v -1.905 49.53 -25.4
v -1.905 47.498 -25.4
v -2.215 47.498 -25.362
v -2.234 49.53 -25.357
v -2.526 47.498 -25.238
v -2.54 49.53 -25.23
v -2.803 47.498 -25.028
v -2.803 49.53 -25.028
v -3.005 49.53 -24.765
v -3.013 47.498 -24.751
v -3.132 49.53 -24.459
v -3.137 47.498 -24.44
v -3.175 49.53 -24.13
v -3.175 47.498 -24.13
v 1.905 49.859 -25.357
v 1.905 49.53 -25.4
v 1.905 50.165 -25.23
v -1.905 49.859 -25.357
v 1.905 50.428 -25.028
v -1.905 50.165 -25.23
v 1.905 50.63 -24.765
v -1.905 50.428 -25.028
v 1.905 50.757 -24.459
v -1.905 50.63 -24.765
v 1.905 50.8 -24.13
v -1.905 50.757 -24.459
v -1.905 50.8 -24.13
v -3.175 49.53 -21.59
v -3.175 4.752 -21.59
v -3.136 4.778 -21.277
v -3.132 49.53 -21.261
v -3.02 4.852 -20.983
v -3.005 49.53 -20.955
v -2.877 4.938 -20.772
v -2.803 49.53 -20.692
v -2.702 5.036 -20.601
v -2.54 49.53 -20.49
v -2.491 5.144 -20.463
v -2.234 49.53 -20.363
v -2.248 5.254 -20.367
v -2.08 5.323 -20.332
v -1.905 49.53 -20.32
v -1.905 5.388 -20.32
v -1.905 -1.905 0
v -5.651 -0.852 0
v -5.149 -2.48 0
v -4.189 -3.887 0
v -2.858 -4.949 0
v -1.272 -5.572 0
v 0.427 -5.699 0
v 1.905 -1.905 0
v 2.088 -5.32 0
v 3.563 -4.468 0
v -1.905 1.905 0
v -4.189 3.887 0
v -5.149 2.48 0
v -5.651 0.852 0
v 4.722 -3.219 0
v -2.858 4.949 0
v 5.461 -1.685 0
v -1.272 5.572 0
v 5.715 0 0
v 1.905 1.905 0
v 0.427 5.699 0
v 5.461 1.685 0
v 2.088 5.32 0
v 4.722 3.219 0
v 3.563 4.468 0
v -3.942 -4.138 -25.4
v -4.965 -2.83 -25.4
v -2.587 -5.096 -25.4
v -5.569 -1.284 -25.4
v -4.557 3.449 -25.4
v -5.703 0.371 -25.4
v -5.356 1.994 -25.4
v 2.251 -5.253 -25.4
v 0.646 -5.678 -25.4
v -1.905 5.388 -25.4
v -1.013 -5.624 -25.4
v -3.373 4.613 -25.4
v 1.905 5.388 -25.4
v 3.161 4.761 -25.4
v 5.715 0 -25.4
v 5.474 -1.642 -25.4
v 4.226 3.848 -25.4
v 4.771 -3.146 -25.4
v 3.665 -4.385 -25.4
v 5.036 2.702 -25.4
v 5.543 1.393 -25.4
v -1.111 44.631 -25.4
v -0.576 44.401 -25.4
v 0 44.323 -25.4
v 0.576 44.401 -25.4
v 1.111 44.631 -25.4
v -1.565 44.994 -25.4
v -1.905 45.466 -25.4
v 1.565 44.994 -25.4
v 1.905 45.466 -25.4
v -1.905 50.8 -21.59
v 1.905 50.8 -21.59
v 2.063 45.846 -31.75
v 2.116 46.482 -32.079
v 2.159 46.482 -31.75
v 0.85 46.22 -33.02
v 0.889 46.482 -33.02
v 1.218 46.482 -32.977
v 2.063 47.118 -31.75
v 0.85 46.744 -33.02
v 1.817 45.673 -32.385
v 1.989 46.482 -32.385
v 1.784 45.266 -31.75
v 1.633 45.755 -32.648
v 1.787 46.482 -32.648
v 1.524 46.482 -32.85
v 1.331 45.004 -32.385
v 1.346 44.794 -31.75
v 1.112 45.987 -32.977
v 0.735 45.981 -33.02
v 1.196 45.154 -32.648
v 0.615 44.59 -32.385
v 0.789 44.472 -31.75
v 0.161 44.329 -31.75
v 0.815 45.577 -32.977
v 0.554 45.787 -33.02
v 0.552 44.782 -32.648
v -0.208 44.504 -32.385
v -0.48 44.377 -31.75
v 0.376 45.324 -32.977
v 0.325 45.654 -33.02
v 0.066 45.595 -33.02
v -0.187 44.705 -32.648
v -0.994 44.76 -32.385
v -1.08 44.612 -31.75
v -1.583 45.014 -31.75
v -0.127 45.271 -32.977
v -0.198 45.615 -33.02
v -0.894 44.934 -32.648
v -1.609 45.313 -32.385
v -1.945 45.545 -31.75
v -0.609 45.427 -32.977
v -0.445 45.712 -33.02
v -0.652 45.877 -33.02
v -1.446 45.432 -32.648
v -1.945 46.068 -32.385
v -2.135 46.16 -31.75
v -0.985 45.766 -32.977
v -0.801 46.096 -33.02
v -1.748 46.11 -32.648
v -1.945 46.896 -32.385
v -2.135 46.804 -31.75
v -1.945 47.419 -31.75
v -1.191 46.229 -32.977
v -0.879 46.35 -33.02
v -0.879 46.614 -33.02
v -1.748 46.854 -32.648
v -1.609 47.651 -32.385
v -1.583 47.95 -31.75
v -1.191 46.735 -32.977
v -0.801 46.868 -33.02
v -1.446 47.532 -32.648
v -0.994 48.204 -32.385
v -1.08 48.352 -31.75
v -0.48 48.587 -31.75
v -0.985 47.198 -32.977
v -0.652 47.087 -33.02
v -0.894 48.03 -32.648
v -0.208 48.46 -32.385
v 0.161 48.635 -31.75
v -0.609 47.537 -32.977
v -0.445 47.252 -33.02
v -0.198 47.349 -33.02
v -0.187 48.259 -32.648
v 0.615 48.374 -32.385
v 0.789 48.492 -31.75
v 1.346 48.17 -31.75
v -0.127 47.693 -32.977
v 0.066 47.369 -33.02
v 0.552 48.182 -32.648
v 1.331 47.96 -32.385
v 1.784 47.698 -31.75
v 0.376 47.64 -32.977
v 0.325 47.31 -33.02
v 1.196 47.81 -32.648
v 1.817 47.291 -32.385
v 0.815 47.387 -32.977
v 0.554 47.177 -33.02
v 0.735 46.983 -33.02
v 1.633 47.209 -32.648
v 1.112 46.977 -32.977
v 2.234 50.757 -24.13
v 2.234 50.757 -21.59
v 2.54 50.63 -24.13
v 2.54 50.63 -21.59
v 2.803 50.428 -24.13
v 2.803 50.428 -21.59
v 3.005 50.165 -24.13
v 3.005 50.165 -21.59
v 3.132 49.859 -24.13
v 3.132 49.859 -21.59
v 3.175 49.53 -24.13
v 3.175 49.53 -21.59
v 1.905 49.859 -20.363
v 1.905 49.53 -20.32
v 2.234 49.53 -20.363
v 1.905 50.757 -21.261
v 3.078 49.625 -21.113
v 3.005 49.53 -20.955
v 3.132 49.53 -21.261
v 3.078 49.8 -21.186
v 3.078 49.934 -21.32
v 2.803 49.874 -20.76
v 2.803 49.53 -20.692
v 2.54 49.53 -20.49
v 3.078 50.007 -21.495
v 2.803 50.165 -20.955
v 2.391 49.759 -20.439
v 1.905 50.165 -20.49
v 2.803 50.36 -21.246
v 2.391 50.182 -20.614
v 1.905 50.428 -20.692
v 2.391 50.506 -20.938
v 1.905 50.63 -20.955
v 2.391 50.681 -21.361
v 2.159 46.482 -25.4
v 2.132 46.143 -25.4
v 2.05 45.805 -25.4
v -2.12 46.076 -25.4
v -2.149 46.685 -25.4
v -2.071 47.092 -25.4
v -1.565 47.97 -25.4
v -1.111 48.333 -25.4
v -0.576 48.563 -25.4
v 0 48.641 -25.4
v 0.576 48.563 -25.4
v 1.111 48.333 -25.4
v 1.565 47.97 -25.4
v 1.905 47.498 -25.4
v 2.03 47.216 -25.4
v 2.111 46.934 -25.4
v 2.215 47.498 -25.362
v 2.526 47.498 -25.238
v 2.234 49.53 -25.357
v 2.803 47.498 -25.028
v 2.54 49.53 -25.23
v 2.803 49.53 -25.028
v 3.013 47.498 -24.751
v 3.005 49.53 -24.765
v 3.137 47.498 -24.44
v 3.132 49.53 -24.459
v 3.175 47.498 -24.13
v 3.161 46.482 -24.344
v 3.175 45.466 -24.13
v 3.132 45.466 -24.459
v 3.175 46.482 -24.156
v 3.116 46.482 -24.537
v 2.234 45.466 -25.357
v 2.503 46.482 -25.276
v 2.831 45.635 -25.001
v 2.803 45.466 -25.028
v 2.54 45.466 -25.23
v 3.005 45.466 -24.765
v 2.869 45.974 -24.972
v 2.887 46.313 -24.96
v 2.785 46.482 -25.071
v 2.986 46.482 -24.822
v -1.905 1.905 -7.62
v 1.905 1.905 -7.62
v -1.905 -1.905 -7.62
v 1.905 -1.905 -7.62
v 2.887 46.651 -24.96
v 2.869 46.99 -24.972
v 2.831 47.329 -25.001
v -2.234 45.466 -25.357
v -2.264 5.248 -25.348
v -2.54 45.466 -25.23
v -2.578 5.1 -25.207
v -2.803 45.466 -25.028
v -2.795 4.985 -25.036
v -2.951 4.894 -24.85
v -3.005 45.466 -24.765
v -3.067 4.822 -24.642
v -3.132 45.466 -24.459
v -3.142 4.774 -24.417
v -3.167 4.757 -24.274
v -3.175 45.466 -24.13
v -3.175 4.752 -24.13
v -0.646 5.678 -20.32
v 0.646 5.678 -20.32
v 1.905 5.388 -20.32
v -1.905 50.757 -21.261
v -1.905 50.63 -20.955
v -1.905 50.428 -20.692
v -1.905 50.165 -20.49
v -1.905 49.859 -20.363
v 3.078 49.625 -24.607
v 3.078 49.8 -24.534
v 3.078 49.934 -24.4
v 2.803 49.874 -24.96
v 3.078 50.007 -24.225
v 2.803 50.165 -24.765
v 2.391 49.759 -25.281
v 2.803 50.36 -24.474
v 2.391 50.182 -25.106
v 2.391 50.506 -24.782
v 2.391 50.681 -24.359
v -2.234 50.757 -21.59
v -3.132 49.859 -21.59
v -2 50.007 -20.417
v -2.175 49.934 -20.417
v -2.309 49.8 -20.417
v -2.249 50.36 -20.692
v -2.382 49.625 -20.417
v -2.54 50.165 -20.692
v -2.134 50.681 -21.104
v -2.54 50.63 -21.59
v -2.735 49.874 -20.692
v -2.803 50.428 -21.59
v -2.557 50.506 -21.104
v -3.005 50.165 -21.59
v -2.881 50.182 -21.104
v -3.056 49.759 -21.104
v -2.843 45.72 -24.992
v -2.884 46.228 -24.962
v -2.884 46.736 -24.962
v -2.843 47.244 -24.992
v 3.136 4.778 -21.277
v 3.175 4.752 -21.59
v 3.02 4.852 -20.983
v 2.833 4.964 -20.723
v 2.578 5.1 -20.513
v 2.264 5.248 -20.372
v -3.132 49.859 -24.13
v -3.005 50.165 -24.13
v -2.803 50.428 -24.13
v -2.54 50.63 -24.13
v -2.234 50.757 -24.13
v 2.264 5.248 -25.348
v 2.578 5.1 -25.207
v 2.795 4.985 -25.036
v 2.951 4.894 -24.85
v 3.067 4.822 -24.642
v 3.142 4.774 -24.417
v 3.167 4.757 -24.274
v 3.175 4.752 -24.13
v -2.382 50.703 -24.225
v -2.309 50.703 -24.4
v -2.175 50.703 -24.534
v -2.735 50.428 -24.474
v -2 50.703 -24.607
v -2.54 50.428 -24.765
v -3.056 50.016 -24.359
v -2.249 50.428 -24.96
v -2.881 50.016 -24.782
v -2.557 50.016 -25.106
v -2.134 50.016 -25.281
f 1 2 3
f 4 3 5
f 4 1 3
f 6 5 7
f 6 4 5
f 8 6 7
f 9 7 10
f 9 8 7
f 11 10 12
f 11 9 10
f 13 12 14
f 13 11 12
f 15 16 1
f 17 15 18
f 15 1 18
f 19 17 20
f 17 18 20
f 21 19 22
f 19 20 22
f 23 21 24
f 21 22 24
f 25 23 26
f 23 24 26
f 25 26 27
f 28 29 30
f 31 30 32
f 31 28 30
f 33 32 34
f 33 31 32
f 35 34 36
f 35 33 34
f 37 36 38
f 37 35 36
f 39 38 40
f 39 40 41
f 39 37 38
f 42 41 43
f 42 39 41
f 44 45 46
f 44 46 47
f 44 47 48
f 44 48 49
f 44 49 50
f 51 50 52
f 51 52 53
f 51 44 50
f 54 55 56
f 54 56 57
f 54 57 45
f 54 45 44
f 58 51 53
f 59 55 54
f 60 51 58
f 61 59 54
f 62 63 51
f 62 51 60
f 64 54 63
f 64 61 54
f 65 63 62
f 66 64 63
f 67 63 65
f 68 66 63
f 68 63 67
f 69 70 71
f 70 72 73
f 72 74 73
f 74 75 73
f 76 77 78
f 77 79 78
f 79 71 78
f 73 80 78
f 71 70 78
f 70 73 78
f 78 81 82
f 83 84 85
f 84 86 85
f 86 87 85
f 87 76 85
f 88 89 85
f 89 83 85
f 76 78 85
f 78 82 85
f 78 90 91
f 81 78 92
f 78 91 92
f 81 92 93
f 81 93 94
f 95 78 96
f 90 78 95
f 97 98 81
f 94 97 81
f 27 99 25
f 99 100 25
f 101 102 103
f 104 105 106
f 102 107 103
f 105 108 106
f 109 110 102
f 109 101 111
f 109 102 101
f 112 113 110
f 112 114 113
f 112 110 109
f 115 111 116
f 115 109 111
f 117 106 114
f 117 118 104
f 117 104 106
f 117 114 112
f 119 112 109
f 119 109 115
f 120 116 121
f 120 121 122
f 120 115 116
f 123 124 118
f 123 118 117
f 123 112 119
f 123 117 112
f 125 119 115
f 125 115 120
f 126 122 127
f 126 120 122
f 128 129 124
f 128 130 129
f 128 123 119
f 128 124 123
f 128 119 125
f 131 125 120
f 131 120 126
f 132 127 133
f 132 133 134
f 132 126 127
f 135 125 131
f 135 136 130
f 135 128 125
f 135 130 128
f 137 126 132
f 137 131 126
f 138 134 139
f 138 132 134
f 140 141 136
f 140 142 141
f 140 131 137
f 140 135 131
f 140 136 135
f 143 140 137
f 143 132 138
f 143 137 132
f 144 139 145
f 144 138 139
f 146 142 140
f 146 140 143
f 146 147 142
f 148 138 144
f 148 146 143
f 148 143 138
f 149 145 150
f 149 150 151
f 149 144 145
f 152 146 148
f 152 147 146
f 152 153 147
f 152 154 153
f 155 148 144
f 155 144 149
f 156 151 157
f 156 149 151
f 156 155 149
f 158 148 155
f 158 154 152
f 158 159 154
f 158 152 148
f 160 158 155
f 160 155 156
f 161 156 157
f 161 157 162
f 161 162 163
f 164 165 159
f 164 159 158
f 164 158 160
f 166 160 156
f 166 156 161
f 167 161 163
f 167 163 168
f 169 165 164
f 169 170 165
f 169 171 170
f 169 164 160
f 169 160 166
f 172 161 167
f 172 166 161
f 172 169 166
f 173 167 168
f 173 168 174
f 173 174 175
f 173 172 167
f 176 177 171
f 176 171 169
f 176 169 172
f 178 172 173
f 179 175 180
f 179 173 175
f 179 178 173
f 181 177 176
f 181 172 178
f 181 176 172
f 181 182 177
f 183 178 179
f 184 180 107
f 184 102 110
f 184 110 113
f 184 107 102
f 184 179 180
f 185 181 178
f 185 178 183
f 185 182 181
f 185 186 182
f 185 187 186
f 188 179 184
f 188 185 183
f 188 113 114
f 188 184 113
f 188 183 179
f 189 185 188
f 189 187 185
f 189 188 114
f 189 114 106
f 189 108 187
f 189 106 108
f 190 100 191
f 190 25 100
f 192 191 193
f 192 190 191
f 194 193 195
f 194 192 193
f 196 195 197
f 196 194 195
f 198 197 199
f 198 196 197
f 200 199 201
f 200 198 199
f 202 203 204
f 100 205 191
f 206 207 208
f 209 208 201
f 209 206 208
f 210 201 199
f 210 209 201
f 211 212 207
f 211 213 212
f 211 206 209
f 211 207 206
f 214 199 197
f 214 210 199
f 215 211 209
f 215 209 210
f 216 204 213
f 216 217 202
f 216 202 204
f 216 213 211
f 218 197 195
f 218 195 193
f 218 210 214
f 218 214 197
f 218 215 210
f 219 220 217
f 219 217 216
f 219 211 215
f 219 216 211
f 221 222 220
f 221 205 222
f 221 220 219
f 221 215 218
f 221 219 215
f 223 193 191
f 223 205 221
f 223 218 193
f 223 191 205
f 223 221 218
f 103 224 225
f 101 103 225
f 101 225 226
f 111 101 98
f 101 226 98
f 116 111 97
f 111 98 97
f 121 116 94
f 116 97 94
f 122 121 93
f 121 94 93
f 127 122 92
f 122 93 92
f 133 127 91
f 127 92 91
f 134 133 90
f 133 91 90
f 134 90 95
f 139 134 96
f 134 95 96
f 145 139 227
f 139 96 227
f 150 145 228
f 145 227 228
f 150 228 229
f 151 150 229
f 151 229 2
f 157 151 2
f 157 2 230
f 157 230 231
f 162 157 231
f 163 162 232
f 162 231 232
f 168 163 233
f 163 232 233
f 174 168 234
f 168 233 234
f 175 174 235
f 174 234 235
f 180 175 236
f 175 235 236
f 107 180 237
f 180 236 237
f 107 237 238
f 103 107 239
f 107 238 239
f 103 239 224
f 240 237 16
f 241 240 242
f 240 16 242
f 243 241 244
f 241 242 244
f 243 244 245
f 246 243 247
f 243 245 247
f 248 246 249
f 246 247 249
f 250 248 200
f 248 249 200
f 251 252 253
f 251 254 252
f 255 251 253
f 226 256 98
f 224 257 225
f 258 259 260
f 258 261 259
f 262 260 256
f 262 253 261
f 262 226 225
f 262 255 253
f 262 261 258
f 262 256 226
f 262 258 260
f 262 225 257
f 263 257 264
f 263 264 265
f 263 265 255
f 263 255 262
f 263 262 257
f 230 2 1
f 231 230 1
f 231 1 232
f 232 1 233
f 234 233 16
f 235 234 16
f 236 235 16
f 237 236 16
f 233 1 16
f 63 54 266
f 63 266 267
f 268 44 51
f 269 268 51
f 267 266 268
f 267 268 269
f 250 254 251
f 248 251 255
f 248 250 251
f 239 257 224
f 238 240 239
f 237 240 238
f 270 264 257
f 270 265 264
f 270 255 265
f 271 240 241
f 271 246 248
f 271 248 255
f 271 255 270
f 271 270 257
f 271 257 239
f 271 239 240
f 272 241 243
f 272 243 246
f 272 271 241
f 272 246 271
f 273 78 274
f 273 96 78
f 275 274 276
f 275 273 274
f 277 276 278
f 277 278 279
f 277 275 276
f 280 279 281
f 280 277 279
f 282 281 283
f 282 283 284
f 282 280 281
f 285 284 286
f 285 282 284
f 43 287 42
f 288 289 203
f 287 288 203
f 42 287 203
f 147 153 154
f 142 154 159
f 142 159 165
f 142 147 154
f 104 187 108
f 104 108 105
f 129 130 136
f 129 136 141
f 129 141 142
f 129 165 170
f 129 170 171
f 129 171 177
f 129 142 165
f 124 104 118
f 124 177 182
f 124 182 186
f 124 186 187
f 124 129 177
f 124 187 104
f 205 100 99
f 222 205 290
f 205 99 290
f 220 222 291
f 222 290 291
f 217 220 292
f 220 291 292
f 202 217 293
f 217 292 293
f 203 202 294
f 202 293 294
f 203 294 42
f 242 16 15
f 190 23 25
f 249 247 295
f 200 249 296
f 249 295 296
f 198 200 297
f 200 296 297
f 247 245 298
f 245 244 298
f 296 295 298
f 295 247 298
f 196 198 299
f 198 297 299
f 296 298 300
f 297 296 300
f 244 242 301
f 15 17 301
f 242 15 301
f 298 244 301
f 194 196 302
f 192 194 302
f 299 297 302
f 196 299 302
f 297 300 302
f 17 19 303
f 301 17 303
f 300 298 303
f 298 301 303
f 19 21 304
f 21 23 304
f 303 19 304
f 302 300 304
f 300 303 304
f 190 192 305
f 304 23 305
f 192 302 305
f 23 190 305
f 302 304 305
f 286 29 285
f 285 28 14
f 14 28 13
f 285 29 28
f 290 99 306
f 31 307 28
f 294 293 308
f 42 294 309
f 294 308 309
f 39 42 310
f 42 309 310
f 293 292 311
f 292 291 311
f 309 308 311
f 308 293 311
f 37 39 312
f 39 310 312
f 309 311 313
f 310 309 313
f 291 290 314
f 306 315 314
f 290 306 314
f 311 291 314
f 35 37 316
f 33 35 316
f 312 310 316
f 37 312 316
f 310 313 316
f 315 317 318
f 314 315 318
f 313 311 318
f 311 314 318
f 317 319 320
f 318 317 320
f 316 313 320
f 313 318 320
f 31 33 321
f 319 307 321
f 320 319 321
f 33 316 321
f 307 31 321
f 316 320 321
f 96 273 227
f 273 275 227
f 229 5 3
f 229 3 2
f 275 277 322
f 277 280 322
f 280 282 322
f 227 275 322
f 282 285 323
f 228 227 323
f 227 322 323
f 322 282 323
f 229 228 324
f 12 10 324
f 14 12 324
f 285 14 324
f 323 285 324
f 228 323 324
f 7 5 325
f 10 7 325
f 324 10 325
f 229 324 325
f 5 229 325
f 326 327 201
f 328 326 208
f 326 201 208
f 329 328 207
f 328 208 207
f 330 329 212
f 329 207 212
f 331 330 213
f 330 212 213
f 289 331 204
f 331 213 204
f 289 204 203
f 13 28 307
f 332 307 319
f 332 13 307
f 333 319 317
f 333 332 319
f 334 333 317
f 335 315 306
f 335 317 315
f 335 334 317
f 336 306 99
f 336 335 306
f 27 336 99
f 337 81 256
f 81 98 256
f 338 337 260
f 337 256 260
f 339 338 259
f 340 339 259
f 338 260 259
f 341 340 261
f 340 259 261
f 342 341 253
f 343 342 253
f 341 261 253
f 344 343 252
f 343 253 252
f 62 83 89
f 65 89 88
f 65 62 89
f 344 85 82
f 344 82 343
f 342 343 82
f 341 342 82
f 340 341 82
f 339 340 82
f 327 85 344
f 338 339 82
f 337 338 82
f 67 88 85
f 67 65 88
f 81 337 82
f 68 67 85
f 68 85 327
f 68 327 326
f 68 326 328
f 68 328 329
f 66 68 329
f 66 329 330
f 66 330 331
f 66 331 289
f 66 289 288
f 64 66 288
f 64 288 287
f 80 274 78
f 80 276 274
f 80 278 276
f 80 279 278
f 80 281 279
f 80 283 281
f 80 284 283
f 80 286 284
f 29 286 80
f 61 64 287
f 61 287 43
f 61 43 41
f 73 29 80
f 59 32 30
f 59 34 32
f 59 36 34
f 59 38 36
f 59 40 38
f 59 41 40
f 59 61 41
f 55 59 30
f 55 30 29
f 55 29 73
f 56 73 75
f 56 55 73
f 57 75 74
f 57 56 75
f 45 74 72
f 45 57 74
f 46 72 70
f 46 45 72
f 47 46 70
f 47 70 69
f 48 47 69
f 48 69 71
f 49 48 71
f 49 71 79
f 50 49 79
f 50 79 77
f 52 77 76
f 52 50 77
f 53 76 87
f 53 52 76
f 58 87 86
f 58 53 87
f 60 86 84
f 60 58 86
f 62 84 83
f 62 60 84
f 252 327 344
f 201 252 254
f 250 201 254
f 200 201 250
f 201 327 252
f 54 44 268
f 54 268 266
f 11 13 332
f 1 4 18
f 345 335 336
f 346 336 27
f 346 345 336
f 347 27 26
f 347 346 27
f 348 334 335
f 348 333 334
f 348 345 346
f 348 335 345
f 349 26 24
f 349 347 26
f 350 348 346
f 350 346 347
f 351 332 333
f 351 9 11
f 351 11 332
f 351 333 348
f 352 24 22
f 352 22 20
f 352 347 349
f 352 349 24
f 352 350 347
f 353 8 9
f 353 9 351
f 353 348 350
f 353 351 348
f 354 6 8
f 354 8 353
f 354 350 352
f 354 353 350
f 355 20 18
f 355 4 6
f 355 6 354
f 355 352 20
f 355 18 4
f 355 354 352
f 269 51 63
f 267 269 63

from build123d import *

# Parameters (mm, degrees)
SKETCH1_R           = 5.715
BOSS_EXTRUDE1_DEPTH = 25.4
SKETCH2_W           = 5.08
SKETCH2_H           = 50.8
BOSS_EXTRUDE2_DEPTH = 3.175
SKETCH3_R           = 2.159
BOSS_EXTRUDE3_DEPTH = 7.62
FILLET1_R           = 1.27
SKETCH4_W           = 3.81
SKETCH4_H           = 3.81
CUT_EXTRUDE1_DEPTH  = 7.62


with BuildPart() as part:
    # Sketch1 → Boss-Extrude1 (new body)
    with BuildSketch(Plane.XY):
        Circle(SKETCH1_R)
    extrude(amount=-BOSS_EXTRUDE1_DEPTH)

    # Sketch2 → Boss-Extrude2 (add, symmetric)
    with BuildSketch(Plane(origin=(0, 0, 0), x_dir=(0, 0, -1), z_dir=(1, 0, 0))):
        with Locations((22.86, 25.4)):
            Rectangle(SKETCH2_W, SKETCH2_H)
    extrude(amount=BOSS_EXTRUDE2_DEPTH, both=True)

    # Sketch3 → Boss-Extrude3 (add)
    with BuildSketch(Plane(origin=(0, 0, -25.4), x_dir=(-1, 0, 0), z_dir=(0, 0, -1))):
        with Locations(Location((0, 46.482, 0), (0, 0, 180))):
            Circle(SKETCH3_R)
    extrude(amount=BOSS_EXTRUDE3_DEPTH)

    # Fillet1
    fillet1_edges = [part.edges().sort_by_distance(p)[0] for p in [
        (-3.175, 27.775952441, -25.4),
        (-3.175, 50.8, -22.86),
        (0, 50.8, -25.4),
        (0, 50.8, -20.32),
        (-3.175, 27.775952441, -20.32),
        (3.175, 27.775952441, -20.32),
        (3.175, 27.775952441, -25.4),
        (3.175, 50.8, -22.86),
        (-2.159, 46.482, -33.02),
    ]]
    fillet(fillet1_edges, radius=FILLET1_R)

    # Sketch4 → Cut-Extrude1 (cut)
    with BuildSketch(Plane.XY):
        Rectangle(SKETCH4_W, SKETCH4_H)
    extrude(amount=-CUT_EXTRUDE1_DEPTH, mode=Mode.SUBTRACT)


solid = part.part
